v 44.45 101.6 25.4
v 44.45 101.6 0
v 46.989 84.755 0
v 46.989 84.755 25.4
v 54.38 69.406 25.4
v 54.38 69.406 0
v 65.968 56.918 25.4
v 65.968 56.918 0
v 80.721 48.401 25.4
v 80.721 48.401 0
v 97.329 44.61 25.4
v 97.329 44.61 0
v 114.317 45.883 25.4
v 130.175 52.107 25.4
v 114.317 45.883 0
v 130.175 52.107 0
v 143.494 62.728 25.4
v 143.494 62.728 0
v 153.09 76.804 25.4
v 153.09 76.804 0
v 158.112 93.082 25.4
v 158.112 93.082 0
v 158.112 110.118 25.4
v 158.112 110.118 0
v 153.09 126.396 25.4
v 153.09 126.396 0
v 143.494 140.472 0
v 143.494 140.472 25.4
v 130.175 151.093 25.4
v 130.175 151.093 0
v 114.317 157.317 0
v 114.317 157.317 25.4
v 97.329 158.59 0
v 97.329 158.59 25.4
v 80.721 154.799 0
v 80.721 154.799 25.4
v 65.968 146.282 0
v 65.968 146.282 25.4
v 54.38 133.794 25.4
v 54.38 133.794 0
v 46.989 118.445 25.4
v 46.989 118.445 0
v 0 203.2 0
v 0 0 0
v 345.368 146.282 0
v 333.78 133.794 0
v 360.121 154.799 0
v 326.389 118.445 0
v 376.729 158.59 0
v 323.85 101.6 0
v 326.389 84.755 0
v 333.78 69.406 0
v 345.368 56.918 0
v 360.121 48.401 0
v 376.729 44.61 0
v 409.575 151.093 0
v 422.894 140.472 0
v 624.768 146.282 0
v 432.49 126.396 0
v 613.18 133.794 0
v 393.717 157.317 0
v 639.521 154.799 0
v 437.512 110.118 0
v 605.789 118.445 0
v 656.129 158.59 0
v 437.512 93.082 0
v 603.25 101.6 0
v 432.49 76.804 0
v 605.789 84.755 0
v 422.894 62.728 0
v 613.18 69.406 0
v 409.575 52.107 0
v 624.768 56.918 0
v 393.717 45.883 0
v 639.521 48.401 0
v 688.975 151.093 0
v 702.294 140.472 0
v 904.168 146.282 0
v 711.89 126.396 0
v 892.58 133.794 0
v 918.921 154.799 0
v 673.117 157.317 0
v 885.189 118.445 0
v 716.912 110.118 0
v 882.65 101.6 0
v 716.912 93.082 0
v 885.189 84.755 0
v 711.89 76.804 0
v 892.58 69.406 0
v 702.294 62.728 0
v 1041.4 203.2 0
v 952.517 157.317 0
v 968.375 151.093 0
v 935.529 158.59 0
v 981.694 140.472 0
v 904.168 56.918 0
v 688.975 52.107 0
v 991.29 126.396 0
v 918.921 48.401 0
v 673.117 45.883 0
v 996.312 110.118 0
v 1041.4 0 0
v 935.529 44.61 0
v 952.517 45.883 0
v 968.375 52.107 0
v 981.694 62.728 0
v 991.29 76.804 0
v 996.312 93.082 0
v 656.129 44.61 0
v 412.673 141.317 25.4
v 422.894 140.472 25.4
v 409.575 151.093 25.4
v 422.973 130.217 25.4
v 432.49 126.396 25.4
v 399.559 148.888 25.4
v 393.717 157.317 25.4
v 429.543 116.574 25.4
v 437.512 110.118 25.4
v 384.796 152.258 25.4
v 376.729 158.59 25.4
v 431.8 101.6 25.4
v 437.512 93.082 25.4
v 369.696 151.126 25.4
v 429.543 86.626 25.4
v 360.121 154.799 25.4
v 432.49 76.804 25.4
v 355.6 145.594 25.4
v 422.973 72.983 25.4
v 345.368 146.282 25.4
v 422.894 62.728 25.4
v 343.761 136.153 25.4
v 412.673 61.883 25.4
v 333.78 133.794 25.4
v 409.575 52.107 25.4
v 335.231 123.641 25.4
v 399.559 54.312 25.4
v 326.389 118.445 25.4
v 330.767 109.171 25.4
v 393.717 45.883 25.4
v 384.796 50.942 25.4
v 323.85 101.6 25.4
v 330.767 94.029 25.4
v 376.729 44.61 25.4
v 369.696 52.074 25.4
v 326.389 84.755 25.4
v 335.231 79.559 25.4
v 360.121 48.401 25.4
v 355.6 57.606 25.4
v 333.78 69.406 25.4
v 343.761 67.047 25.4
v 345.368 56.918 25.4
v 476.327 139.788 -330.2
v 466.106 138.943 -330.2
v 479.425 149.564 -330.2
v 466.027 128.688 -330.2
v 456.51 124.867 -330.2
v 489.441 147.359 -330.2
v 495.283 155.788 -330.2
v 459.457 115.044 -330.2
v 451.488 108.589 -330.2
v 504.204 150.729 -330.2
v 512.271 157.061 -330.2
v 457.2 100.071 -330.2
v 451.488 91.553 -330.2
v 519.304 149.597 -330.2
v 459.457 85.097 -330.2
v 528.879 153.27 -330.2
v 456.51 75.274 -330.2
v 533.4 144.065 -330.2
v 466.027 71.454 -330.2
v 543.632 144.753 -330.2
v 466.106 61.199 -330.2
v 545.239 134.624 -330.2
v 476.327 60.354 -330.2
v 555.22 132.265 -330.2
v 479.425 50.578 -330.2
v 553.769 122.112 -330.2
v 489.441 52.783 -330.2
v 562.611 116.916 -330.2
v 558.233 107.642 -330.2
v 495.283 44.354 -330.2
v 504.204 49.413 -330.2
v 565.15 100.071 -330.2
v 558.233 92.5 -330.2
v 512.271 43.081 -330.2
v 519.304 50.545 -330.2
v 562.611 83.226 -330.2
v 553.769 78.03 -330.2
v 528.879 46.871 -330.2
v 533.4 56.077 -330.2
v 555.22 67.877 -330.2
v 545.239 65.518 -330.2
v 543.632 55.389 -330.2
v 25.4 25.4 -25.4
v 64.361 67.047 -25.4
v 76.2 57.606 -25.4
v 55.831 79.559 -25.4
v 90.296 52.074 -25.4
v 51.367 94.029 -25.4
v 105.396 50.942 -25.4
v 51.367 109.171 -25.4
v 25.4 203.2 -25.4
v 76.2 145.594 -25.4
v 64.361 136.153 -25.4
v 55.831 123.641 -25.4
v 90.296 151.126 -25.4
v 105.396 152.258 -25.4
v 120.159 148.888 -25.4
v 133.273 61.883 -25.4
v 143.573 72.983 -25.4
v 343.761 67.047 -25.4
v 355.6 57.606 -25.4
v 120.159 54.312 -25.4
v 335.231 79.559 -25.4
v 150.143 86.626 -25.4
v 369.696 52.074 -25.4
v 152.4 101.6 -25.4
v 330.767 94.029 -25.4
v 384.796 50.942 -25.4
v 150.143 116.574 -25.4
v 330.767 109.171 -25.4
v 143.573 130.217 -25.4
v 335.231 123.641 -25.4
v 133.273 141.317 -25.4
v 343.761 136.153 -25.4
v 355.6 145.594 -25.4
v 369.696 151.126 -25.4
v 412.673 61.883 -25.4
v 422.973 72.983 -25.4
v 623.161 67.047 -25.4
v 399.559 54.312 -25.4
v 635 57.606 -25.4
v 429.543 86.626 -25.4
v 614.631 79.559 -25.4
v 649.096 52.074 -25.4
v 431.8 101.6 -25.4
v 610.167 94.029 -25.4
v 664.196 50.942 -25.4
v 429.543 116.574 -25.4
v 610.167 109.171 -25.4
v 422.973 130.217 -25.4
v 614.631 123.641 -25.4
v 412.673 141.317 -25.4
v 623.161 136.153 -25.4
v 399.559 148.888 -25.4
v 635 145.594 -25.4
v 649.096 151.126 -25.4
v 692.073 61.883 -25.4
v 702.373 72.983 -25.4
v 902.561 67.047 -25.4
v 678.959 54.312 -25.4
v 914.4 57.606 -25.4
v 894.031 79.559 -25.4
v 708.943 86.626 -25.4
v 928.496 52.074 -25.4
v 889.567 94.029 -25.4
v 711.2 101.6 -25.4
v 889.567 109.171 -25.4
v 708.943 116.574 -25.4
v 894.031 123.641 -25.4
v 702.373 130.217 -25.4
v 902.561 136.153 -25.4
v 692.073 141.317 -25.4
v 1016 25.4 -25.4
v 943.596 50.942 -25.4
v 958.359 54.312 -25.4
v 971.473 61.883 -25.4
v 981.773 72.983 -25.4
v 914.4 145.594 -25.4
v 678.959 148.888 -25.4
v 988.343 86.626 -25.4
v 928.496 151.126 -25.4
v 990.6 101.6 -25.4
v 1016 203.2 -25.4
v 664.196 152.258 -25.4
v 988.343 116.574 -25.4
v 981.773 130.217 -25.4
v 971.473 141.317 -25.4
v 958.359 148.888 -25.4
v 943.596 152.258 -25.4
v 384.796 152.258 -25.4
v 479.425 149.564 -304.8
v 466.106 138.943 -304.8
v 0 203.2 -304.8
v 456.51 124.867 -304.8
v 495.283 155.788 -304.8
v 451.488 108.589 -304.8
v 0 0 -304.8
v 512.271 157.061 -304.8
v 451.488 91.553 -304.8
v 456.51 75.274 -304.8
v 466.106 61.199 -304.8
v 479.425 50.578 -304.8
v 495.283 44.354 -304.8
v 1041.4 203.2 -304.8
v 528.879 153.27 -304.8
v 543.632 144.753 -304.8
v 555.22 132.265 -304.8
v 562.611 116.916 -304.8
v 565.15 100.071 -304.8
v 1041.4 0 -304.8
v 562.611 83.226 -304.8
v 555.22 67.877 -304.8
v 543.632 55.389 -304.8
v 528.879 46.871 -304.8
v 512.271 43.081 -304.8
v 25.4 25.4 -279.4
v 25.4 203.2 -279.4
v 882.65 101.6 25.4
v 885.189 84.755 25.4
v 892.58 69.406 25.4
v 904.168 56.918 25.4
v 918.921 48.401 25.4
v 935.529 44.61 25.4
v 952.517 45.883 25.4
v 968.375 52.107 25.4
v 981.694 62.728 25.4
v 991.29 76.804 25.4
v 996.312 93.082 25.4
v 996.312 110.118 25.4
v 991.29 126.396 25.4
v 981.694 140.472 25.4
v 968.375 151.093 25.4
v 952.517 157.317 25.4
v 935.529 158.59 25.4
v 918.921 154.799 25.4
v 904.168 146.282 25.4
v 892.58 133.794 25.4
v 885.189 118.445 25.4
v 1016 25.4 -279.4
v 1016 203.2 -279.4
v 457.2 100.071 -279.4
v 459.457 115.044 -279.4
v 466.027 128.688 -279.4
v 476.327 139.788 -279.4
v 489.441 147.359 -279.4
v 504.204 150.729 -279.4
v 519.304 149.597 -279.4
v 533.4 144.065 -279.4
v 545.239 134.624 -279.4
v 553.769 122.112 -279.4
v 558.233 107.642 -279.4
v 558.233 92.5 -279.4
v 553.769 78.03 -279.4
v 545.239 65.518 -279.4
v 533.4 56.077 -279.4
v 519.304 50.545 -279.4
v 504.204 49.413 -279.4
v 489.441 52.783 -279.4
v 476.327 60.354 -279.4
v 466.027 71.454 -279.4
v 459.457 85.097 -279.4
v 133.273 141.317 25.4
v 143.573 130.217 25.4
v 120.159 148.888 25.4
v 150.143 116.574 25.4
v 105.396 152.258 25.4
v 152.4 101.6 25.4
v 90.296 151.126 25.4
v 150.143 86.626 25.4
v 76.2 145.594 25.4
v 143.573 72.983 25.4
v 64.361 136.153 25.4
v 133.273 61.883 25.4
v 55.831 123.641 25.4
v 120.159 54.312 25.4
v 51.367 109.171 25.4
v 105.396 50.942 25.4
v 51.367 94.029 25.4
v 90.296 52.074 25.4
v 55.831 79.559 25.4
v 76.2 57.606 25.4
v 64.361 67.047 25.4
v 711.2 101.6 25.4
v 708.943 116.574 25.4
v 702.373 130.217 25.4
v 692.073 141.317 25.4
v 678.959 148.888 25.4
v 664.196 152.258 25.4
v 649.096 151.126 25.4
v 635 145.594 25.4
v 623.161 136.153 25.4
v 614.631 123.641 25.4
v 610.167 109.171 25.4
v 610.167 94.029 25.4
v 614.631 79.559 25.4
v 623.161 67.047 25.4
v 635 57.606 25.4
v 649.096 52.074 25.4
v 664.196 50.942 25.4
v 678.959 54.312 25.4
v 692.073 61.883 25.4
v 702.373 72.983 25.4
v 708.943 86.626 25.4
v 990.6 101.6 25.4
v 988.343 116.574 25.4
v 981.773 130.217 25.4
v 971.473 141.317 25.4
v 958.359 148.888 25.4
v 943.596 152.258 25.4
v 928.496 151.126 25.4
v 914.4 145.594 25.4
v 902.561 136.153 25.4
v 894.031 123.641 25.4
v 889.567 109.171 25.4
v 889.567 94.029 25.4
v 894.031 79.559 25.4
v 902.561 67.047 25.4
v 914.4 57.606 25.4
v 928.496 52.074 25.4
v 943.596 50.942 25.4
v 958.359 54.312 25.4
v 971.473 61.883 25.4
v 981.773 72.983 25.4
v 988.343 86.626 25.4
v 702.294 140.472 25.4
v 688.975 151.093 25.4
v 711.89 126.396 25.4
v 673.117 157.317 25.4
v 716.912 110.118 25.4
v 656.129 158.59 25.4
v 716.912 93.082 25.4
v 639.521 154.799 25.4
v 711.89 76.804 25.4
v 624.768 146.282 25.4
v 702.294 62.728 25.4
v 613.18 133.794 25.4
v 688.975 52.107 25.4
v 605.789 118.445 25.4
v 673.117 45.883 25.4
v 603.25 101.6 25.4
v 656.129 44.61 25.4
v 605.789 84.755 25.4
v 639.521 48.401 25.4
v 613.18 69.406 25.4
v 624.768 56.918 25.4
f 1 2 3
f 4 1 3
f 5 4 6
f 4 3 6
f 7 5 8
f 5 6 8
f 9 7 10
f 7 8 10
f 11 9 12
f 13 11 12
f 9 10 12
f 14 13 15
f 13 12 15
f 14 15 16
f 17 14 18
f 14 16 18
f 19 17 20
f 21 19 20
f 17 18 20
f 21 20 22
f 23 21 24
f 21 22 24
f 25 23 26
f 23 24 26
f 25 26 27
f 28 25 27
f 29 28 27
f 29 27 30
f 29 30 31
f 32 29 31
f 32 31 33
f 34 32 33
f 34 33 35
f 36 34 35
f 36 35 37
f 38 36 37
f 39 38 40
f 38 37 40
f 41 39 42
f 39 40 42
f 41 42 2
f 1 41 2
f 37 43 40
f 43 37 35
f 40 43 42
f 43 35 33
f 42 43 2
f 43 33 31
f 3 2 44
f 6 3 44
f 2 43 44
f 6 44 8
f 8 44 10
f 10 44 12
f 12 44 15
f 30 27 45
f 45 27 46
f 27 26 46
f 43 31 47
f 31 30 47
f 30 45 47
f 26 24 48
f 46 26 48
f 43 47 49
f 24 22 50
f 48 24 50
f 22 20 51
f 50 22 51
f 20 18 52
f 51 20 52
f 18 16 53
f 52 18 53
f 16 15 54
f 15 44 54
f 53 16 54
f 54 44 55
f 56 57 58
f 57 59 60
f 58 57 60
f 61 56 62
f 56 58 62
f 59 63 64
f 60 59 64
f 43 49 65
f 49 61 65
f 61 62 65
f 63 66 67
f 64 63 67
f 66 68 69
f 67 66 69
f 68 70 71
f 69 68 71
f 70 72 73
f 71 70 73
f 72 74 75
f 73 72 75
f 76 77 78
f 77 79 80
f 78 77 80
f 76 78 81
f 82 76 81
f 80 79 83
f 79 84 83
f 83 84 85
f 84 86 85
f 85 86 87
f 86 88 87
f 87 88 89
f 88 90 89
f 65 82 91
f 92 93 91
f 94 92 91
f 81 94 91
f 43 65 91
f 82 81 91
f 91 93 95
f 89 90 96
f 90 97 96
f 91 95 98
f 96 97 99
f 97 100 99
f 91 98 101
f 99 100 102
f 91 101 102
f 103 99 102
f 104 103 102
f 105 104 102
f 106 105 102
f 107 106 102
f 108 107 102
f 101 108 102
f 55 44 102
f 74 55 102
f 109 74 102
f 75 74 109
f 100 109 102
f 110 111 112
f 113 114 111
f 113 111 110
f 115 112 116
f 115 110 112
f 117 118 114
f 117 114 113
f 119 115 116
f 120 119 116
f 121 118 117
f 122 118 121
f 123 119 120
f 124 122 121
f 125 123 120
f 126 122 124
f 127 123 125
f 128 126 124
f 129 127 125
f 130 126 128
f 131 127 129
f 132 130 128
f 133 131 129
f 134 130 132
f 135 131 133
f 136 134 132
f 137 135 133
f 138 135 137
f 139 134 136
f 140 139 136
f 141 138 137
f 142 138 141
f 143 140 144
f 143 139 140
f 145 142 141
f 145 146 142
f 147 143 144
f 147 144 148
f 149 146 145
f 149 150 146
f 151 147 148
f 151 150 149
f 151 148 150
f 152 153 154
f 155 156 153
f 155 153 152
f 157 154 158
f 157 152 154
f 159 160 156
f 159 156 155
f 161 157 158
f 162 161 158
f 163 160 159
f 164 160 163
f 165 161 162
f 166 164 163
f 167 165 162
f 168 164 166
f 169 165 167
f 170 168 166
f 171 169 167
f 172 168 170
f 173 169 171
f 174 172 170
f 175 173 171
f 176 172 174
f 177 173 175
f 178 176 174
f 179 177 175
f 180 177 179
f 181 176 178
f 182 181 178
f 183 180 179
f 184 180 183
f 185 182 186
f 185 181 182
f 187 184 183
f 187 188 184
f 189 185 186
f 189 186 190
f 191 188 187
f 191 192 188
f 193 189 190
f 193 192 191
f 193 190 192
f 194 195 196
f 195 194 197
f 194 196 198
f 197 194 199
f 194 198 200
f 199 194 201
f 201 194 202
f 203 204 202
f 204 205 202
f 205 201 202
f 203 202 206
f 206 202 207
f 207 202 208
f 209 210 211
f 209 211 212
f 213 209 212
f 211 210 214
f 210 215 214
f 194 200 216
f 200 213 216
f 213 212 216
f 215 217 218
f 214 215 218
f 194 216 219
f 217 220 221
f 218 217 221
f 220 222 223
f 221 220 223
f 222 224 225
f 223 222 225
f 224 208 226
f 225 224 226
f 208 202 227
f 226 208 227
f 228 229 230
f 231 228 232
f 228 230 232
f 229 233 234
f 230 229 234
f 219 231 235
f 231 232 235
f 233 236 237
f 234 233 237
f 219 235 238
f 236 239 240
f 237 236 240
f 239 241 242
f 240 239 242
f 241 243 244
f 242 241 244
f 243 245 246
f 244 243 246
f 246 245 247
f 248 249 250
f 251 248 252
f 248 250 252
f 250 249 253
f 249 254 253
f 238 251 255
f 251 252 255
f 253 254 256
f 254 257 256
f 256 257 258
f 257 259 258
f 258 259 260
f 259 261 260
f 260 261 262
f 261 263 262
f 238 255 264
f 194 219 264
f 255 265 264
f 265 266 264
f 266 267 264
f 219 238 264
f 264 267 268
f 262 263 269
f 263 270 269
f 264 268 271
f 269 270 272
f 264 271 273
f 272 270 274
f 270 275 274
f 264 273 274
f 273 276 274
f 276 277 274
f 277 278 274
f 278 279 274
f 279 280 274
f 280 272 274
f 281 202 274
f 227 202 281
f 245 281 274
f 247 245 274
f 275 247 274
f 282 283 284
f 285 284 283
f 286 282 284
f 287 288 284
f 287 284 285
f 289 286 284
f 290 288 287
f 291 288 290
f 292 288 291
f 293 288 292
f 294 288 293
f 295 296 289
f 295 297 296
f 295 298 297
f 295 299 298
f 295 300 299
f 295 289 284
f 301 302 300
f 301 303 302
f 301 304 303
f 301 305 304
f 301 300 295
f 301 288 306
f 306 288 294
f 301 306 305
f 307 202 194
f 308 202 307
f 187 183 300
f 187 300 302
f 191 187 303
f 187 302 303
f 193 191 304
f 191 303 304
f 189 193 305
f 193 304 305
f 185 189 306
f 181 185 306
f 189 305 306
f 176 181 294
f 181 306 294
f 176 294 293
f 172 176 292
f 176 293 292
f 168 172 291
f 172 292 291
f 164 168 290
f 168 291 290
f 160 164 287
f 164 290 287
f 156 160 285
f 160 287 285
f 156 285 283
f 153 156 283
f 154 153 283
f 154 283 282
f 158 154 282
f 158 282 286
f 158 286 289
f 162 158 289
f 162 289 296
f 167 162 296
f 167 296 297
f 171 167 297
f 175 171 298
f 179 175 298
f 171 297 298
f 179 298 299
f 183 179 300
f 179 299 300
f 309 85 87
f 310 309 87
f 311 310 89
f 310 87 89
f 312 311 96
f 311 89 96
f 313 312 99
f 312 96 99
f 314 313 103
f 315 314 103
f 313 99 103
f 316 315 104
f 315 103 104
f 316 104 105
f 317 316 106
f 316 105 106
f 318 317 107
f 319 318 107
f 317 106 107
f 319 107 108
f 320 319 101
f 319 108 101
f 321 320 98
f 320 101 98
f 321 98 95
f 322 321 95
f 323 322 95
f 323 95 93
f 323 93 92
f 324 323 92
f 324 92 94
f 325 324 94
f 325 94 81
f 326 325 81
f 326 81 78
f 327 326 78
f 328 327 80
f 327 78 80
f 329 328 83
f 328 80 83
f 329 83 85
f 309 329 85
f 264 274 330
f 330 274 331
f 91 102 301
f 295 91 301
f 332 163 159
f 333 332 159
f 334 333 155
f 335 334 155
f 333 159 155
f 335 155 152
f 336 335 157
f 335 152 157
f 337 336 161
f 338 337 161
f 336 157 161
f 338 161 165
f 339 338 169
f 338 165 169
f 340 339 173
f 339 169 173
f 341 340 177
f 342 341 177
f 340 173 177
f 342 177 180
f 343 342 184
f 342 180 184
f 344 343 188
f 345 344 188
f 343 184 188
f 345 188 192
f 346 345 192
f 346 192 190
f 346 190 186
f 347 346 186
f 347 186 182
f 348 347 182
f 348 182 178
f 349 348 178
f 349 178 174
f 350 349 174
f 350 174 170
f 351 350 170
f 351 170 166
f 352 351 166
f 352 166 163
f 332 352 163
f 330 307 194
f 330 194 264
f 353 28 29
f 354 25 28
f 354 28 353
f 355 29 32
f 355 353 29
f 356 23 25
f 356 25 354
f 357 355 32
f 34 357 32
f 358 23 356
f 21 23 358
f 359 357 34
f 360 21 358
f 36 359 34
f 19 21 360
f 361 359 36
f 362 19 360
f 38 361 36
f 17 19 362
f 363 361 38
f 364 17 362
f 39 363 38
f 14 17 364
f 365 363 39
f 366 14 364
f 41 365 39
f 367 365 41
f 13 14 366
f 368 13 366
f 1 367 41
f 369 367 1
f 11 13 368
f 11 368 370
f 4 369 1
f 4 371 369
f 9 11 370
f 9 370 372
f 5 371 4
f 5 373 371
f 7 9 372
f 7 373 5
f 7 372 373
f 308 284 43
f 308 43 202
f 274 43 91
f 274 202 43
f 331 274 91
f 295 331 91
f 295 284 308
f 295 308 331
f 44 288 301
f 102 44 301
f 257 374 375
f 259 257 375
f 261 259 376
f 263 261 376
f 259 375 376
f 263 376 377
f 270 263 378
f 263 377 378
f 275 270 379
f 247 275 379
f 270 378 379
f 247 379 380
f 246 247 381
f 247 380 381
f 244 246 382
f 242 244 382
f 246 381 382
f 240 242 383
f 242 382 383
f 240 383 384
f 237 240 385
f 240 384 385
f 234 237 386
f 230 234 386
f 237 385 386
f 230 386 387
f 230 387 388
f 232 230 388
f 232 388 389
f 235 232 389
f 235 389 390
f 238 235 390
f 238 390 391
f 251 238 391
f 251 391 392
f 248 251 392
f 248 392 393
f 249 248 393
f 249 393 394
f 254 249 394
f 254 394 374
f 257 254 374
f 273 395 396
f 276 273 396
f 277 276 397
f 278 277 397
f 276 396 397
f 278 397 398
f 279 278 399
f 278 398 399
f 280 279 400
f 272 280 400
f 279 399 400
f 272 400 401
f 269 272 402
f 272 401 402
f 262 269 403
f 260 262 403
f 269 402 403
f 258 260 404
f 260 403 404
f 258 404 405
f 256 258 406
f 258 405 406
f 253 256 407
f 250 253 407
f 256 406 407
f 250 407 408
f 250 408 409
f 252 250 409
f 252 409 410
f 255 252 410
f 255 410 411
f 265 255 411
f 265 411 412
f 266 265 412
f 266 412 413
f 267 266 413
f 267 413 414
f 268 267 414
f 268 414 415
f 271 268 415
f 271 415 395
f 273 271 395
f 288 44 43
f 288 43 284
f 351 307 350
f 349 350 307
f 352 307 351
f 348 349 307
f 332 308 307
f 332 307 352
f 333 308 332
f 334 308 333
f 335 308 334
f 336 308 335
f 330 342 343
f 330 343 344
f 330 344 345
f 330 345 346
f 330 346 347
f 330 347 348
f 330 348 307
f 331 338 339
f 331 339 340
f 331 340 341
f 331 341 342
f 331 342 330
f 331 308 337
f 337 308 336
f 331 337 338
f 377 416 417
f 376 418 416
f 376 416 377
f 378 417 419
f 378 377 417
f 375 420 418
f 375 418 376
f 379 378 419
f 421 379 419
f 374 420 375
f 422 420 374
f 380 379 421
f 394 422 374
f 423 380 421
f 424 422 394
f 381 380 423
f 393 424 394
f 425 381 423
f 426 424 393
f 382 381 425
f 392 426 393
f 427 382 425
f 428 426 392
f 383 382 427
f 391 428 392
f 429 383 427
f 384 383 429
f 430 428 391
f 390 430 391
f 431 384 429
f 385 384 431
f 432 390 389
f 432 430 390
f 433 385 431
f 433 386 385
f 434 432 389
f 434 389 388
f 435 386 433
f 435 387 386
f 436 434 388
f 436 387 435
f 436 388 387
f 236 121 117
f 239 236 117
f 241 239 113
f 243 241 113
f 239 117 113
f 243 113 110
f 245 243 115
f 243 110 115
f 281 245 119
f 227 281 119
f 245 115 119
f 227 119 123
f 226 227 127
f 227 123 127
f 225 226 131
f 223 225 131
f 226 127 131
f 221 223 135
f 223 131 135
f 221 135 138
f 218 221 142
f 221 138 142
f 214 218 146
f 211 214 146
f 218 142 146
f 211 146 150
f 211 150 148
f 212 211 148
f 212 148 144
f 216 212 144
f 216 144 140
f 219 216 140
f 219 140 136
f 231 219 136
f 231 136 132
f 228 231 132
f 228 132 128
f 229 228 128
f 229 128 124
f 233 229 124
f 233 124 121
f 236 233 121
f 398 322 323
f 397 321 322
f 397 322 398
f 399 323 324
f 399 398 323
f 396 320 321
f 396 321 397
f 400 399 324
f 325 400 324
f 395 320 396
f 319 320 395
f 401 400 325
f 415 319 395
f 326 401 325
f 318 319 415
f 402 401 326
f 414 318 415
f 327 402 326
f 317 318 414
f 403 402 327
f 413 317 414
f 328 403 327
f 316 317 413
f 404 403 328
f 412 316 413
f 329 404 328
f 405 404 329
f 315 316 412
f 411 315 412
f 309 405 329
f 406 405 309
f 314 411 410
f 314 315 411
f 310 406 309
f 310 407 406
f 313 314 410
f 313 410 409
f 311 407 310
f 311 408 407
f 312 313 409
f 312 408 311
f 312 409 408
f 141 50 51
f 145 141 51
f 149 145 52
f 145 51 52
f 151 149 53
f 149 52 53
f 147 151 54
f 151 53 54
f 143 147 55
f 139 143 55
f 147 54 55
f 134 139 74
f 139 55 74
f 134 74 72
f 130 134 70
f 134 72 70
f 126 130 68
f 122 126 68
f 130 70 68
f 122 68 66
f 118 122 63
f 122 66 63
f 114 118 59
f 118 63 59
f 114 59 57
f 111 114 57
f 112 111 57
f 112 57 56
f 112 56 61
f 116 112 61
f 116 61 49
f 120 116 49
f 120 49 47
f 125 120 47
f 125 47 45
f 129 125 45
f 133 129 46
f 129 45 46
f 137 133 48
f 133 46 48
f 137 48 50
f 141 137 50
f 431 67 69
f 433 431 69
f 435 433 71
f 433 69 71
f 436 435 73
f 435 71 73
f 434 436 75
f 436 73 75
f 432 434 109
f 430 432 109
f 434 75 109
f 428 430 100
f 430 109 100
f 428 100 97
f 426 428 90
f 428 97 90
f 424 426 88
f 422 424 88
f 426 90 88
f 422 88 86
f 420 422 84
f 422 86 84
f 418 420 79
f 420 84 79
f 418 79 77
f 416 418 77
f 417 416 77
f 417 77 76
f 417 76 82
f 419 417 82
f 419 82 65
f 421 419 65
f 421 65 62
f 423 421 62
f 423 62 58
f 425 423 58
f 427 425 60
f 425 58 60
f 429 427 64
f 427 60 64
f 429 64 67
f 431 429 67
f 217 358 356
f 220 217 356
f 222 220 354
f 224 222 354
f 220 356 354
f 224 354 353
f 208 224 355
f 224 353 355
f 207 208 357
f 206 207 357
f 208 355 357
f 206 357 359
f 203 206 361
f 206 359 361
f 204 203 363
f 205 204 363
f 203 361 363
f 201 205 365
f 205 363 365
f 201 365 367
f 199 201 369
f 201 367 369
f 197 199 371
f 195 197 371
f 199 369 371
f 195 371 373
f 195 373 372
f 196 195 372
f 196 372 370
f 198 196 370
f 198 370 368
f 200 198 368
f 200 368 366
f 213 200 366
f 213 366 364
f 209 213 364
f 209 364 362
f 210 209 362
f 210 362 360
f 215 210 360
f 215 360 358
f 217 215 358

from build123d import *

# Parameters (mm, degrees)
SKETCH1_W           = 1041.4
SKETCH1_H           = 304.8
BOSS_EXTRUDE1_DEPTH = 203.2
SKETCH3_R           = 57.15
BOSS_EXTRUDE2_DEPTH = 25.4
SKETCH4_R           = 57.15
BOSS_EXTRUDE3_DEPTH = 25.4
SKETCH5_W           = 990.6
SKETCH5_H           = 254
CUT_EXTRUDE1_DEPTH  = 177.8
SKETCH6_R           = 50.8
CUT_EXTRUDE2_DEPTH  = 177.8
SKETCH7_R           = 50.8
CUT_EXTRUDE3_DEPTH  = 177.8


with BuildPart() as part:
    # Sketch1 → Boss-Extrude1 (new body)
    with BuildSketch(Plane(origin=(0, 0, 0), x_dir=(1, 0, 0), z_dir=(0, 1, 0))):
        with Locations((520.7, 152.4)):
            Rectangle(SKETCH1_W, SKETCH1_H)
    extrude(amount=BOSS_EXTRUDE1_DEPTH)

    # Sketch3 → Boss-Extrude2 (add)
    with BuildSketch(Plane.XY):
        with Locations(Location((101.6, 101.6, 0), (0, 0, 180))):
            Circle(SKETCH3_R)
        with Locations(Location((381, 101.6, 0), (0, 0, 180))):
            Circle(SKETCH3_R)
        with Locations(Location((660.4, 101.6, 0), (0, 0, 180))):
            Circle(SKETCH3_R)
        with Locations(Location((939.8, 101.6, 0), (0, 0, 180))):
            Circle(SKETCH3_R)
    extrude(amount=BOSS_EXTRUDE2_DEPTH)

    # Sketch4 → Boss-Extrude3 (add)
    with BuildSketch(Plane(origin=(0, 0, -304.8), x_dir=(-1, 0, 0), z_dir=(0, 0, -1))):
        with Locations(Location((-508, 100.070914483, 0), (0, 0, 180))):
            Circle(SKETCH4_R)
    extrude(amount=BOSS_EXTRUDE3_DEPTH)

    # Sketch5 → Cut-Extrude1 (cut)
    with BuildSketch(Plane(origin=(0, 203.2, 0), x_dir=(1, 0, 0), z_dir=(0, 1, 0))):
        with Locations((520.7, 152.4)):
            Rectangle(SKETCH5_W, SKETCH5_H)
    extrude(amount=-CUT_EXTRUDE1_DEPTH, mode=Mode.SUBTRACT)

    # Sketch6 → Cut-Extrude2 (cut)
    with BuildSketch(Plane.XY.offset(25.4)):
        with Locations((101.6, 101.6)):
            Circle(SKETCH6_R)
        with Locations((381, 101.6)):
            Circle(SKETCH6_R)
        with Locations((660.4, 101.6)):
            Circle(SKETCH6_R)
        with Locations((939.8, 101.6)):
            Circle(SKETCH6_R)
    extrude(amount=-CUT_EXTRUDE2_DEPTH, mode=Mode.SUBTRACT)

    # Sketch7 → Cut-Extrude3 (cut)
    with BuildSketch(Plane(origin=(0, 0, -330.2), x_dir=(-1, 0, 0), z_dir=(0, 0, -1))):
        with Locations((-508, 100.070914483)):
            Circle(SKETCH7_R)
    extrude(amount=-CUT_EXTRUDE3_DEPTH, mode=Mode.SUBTRACT)


solid = part.part
